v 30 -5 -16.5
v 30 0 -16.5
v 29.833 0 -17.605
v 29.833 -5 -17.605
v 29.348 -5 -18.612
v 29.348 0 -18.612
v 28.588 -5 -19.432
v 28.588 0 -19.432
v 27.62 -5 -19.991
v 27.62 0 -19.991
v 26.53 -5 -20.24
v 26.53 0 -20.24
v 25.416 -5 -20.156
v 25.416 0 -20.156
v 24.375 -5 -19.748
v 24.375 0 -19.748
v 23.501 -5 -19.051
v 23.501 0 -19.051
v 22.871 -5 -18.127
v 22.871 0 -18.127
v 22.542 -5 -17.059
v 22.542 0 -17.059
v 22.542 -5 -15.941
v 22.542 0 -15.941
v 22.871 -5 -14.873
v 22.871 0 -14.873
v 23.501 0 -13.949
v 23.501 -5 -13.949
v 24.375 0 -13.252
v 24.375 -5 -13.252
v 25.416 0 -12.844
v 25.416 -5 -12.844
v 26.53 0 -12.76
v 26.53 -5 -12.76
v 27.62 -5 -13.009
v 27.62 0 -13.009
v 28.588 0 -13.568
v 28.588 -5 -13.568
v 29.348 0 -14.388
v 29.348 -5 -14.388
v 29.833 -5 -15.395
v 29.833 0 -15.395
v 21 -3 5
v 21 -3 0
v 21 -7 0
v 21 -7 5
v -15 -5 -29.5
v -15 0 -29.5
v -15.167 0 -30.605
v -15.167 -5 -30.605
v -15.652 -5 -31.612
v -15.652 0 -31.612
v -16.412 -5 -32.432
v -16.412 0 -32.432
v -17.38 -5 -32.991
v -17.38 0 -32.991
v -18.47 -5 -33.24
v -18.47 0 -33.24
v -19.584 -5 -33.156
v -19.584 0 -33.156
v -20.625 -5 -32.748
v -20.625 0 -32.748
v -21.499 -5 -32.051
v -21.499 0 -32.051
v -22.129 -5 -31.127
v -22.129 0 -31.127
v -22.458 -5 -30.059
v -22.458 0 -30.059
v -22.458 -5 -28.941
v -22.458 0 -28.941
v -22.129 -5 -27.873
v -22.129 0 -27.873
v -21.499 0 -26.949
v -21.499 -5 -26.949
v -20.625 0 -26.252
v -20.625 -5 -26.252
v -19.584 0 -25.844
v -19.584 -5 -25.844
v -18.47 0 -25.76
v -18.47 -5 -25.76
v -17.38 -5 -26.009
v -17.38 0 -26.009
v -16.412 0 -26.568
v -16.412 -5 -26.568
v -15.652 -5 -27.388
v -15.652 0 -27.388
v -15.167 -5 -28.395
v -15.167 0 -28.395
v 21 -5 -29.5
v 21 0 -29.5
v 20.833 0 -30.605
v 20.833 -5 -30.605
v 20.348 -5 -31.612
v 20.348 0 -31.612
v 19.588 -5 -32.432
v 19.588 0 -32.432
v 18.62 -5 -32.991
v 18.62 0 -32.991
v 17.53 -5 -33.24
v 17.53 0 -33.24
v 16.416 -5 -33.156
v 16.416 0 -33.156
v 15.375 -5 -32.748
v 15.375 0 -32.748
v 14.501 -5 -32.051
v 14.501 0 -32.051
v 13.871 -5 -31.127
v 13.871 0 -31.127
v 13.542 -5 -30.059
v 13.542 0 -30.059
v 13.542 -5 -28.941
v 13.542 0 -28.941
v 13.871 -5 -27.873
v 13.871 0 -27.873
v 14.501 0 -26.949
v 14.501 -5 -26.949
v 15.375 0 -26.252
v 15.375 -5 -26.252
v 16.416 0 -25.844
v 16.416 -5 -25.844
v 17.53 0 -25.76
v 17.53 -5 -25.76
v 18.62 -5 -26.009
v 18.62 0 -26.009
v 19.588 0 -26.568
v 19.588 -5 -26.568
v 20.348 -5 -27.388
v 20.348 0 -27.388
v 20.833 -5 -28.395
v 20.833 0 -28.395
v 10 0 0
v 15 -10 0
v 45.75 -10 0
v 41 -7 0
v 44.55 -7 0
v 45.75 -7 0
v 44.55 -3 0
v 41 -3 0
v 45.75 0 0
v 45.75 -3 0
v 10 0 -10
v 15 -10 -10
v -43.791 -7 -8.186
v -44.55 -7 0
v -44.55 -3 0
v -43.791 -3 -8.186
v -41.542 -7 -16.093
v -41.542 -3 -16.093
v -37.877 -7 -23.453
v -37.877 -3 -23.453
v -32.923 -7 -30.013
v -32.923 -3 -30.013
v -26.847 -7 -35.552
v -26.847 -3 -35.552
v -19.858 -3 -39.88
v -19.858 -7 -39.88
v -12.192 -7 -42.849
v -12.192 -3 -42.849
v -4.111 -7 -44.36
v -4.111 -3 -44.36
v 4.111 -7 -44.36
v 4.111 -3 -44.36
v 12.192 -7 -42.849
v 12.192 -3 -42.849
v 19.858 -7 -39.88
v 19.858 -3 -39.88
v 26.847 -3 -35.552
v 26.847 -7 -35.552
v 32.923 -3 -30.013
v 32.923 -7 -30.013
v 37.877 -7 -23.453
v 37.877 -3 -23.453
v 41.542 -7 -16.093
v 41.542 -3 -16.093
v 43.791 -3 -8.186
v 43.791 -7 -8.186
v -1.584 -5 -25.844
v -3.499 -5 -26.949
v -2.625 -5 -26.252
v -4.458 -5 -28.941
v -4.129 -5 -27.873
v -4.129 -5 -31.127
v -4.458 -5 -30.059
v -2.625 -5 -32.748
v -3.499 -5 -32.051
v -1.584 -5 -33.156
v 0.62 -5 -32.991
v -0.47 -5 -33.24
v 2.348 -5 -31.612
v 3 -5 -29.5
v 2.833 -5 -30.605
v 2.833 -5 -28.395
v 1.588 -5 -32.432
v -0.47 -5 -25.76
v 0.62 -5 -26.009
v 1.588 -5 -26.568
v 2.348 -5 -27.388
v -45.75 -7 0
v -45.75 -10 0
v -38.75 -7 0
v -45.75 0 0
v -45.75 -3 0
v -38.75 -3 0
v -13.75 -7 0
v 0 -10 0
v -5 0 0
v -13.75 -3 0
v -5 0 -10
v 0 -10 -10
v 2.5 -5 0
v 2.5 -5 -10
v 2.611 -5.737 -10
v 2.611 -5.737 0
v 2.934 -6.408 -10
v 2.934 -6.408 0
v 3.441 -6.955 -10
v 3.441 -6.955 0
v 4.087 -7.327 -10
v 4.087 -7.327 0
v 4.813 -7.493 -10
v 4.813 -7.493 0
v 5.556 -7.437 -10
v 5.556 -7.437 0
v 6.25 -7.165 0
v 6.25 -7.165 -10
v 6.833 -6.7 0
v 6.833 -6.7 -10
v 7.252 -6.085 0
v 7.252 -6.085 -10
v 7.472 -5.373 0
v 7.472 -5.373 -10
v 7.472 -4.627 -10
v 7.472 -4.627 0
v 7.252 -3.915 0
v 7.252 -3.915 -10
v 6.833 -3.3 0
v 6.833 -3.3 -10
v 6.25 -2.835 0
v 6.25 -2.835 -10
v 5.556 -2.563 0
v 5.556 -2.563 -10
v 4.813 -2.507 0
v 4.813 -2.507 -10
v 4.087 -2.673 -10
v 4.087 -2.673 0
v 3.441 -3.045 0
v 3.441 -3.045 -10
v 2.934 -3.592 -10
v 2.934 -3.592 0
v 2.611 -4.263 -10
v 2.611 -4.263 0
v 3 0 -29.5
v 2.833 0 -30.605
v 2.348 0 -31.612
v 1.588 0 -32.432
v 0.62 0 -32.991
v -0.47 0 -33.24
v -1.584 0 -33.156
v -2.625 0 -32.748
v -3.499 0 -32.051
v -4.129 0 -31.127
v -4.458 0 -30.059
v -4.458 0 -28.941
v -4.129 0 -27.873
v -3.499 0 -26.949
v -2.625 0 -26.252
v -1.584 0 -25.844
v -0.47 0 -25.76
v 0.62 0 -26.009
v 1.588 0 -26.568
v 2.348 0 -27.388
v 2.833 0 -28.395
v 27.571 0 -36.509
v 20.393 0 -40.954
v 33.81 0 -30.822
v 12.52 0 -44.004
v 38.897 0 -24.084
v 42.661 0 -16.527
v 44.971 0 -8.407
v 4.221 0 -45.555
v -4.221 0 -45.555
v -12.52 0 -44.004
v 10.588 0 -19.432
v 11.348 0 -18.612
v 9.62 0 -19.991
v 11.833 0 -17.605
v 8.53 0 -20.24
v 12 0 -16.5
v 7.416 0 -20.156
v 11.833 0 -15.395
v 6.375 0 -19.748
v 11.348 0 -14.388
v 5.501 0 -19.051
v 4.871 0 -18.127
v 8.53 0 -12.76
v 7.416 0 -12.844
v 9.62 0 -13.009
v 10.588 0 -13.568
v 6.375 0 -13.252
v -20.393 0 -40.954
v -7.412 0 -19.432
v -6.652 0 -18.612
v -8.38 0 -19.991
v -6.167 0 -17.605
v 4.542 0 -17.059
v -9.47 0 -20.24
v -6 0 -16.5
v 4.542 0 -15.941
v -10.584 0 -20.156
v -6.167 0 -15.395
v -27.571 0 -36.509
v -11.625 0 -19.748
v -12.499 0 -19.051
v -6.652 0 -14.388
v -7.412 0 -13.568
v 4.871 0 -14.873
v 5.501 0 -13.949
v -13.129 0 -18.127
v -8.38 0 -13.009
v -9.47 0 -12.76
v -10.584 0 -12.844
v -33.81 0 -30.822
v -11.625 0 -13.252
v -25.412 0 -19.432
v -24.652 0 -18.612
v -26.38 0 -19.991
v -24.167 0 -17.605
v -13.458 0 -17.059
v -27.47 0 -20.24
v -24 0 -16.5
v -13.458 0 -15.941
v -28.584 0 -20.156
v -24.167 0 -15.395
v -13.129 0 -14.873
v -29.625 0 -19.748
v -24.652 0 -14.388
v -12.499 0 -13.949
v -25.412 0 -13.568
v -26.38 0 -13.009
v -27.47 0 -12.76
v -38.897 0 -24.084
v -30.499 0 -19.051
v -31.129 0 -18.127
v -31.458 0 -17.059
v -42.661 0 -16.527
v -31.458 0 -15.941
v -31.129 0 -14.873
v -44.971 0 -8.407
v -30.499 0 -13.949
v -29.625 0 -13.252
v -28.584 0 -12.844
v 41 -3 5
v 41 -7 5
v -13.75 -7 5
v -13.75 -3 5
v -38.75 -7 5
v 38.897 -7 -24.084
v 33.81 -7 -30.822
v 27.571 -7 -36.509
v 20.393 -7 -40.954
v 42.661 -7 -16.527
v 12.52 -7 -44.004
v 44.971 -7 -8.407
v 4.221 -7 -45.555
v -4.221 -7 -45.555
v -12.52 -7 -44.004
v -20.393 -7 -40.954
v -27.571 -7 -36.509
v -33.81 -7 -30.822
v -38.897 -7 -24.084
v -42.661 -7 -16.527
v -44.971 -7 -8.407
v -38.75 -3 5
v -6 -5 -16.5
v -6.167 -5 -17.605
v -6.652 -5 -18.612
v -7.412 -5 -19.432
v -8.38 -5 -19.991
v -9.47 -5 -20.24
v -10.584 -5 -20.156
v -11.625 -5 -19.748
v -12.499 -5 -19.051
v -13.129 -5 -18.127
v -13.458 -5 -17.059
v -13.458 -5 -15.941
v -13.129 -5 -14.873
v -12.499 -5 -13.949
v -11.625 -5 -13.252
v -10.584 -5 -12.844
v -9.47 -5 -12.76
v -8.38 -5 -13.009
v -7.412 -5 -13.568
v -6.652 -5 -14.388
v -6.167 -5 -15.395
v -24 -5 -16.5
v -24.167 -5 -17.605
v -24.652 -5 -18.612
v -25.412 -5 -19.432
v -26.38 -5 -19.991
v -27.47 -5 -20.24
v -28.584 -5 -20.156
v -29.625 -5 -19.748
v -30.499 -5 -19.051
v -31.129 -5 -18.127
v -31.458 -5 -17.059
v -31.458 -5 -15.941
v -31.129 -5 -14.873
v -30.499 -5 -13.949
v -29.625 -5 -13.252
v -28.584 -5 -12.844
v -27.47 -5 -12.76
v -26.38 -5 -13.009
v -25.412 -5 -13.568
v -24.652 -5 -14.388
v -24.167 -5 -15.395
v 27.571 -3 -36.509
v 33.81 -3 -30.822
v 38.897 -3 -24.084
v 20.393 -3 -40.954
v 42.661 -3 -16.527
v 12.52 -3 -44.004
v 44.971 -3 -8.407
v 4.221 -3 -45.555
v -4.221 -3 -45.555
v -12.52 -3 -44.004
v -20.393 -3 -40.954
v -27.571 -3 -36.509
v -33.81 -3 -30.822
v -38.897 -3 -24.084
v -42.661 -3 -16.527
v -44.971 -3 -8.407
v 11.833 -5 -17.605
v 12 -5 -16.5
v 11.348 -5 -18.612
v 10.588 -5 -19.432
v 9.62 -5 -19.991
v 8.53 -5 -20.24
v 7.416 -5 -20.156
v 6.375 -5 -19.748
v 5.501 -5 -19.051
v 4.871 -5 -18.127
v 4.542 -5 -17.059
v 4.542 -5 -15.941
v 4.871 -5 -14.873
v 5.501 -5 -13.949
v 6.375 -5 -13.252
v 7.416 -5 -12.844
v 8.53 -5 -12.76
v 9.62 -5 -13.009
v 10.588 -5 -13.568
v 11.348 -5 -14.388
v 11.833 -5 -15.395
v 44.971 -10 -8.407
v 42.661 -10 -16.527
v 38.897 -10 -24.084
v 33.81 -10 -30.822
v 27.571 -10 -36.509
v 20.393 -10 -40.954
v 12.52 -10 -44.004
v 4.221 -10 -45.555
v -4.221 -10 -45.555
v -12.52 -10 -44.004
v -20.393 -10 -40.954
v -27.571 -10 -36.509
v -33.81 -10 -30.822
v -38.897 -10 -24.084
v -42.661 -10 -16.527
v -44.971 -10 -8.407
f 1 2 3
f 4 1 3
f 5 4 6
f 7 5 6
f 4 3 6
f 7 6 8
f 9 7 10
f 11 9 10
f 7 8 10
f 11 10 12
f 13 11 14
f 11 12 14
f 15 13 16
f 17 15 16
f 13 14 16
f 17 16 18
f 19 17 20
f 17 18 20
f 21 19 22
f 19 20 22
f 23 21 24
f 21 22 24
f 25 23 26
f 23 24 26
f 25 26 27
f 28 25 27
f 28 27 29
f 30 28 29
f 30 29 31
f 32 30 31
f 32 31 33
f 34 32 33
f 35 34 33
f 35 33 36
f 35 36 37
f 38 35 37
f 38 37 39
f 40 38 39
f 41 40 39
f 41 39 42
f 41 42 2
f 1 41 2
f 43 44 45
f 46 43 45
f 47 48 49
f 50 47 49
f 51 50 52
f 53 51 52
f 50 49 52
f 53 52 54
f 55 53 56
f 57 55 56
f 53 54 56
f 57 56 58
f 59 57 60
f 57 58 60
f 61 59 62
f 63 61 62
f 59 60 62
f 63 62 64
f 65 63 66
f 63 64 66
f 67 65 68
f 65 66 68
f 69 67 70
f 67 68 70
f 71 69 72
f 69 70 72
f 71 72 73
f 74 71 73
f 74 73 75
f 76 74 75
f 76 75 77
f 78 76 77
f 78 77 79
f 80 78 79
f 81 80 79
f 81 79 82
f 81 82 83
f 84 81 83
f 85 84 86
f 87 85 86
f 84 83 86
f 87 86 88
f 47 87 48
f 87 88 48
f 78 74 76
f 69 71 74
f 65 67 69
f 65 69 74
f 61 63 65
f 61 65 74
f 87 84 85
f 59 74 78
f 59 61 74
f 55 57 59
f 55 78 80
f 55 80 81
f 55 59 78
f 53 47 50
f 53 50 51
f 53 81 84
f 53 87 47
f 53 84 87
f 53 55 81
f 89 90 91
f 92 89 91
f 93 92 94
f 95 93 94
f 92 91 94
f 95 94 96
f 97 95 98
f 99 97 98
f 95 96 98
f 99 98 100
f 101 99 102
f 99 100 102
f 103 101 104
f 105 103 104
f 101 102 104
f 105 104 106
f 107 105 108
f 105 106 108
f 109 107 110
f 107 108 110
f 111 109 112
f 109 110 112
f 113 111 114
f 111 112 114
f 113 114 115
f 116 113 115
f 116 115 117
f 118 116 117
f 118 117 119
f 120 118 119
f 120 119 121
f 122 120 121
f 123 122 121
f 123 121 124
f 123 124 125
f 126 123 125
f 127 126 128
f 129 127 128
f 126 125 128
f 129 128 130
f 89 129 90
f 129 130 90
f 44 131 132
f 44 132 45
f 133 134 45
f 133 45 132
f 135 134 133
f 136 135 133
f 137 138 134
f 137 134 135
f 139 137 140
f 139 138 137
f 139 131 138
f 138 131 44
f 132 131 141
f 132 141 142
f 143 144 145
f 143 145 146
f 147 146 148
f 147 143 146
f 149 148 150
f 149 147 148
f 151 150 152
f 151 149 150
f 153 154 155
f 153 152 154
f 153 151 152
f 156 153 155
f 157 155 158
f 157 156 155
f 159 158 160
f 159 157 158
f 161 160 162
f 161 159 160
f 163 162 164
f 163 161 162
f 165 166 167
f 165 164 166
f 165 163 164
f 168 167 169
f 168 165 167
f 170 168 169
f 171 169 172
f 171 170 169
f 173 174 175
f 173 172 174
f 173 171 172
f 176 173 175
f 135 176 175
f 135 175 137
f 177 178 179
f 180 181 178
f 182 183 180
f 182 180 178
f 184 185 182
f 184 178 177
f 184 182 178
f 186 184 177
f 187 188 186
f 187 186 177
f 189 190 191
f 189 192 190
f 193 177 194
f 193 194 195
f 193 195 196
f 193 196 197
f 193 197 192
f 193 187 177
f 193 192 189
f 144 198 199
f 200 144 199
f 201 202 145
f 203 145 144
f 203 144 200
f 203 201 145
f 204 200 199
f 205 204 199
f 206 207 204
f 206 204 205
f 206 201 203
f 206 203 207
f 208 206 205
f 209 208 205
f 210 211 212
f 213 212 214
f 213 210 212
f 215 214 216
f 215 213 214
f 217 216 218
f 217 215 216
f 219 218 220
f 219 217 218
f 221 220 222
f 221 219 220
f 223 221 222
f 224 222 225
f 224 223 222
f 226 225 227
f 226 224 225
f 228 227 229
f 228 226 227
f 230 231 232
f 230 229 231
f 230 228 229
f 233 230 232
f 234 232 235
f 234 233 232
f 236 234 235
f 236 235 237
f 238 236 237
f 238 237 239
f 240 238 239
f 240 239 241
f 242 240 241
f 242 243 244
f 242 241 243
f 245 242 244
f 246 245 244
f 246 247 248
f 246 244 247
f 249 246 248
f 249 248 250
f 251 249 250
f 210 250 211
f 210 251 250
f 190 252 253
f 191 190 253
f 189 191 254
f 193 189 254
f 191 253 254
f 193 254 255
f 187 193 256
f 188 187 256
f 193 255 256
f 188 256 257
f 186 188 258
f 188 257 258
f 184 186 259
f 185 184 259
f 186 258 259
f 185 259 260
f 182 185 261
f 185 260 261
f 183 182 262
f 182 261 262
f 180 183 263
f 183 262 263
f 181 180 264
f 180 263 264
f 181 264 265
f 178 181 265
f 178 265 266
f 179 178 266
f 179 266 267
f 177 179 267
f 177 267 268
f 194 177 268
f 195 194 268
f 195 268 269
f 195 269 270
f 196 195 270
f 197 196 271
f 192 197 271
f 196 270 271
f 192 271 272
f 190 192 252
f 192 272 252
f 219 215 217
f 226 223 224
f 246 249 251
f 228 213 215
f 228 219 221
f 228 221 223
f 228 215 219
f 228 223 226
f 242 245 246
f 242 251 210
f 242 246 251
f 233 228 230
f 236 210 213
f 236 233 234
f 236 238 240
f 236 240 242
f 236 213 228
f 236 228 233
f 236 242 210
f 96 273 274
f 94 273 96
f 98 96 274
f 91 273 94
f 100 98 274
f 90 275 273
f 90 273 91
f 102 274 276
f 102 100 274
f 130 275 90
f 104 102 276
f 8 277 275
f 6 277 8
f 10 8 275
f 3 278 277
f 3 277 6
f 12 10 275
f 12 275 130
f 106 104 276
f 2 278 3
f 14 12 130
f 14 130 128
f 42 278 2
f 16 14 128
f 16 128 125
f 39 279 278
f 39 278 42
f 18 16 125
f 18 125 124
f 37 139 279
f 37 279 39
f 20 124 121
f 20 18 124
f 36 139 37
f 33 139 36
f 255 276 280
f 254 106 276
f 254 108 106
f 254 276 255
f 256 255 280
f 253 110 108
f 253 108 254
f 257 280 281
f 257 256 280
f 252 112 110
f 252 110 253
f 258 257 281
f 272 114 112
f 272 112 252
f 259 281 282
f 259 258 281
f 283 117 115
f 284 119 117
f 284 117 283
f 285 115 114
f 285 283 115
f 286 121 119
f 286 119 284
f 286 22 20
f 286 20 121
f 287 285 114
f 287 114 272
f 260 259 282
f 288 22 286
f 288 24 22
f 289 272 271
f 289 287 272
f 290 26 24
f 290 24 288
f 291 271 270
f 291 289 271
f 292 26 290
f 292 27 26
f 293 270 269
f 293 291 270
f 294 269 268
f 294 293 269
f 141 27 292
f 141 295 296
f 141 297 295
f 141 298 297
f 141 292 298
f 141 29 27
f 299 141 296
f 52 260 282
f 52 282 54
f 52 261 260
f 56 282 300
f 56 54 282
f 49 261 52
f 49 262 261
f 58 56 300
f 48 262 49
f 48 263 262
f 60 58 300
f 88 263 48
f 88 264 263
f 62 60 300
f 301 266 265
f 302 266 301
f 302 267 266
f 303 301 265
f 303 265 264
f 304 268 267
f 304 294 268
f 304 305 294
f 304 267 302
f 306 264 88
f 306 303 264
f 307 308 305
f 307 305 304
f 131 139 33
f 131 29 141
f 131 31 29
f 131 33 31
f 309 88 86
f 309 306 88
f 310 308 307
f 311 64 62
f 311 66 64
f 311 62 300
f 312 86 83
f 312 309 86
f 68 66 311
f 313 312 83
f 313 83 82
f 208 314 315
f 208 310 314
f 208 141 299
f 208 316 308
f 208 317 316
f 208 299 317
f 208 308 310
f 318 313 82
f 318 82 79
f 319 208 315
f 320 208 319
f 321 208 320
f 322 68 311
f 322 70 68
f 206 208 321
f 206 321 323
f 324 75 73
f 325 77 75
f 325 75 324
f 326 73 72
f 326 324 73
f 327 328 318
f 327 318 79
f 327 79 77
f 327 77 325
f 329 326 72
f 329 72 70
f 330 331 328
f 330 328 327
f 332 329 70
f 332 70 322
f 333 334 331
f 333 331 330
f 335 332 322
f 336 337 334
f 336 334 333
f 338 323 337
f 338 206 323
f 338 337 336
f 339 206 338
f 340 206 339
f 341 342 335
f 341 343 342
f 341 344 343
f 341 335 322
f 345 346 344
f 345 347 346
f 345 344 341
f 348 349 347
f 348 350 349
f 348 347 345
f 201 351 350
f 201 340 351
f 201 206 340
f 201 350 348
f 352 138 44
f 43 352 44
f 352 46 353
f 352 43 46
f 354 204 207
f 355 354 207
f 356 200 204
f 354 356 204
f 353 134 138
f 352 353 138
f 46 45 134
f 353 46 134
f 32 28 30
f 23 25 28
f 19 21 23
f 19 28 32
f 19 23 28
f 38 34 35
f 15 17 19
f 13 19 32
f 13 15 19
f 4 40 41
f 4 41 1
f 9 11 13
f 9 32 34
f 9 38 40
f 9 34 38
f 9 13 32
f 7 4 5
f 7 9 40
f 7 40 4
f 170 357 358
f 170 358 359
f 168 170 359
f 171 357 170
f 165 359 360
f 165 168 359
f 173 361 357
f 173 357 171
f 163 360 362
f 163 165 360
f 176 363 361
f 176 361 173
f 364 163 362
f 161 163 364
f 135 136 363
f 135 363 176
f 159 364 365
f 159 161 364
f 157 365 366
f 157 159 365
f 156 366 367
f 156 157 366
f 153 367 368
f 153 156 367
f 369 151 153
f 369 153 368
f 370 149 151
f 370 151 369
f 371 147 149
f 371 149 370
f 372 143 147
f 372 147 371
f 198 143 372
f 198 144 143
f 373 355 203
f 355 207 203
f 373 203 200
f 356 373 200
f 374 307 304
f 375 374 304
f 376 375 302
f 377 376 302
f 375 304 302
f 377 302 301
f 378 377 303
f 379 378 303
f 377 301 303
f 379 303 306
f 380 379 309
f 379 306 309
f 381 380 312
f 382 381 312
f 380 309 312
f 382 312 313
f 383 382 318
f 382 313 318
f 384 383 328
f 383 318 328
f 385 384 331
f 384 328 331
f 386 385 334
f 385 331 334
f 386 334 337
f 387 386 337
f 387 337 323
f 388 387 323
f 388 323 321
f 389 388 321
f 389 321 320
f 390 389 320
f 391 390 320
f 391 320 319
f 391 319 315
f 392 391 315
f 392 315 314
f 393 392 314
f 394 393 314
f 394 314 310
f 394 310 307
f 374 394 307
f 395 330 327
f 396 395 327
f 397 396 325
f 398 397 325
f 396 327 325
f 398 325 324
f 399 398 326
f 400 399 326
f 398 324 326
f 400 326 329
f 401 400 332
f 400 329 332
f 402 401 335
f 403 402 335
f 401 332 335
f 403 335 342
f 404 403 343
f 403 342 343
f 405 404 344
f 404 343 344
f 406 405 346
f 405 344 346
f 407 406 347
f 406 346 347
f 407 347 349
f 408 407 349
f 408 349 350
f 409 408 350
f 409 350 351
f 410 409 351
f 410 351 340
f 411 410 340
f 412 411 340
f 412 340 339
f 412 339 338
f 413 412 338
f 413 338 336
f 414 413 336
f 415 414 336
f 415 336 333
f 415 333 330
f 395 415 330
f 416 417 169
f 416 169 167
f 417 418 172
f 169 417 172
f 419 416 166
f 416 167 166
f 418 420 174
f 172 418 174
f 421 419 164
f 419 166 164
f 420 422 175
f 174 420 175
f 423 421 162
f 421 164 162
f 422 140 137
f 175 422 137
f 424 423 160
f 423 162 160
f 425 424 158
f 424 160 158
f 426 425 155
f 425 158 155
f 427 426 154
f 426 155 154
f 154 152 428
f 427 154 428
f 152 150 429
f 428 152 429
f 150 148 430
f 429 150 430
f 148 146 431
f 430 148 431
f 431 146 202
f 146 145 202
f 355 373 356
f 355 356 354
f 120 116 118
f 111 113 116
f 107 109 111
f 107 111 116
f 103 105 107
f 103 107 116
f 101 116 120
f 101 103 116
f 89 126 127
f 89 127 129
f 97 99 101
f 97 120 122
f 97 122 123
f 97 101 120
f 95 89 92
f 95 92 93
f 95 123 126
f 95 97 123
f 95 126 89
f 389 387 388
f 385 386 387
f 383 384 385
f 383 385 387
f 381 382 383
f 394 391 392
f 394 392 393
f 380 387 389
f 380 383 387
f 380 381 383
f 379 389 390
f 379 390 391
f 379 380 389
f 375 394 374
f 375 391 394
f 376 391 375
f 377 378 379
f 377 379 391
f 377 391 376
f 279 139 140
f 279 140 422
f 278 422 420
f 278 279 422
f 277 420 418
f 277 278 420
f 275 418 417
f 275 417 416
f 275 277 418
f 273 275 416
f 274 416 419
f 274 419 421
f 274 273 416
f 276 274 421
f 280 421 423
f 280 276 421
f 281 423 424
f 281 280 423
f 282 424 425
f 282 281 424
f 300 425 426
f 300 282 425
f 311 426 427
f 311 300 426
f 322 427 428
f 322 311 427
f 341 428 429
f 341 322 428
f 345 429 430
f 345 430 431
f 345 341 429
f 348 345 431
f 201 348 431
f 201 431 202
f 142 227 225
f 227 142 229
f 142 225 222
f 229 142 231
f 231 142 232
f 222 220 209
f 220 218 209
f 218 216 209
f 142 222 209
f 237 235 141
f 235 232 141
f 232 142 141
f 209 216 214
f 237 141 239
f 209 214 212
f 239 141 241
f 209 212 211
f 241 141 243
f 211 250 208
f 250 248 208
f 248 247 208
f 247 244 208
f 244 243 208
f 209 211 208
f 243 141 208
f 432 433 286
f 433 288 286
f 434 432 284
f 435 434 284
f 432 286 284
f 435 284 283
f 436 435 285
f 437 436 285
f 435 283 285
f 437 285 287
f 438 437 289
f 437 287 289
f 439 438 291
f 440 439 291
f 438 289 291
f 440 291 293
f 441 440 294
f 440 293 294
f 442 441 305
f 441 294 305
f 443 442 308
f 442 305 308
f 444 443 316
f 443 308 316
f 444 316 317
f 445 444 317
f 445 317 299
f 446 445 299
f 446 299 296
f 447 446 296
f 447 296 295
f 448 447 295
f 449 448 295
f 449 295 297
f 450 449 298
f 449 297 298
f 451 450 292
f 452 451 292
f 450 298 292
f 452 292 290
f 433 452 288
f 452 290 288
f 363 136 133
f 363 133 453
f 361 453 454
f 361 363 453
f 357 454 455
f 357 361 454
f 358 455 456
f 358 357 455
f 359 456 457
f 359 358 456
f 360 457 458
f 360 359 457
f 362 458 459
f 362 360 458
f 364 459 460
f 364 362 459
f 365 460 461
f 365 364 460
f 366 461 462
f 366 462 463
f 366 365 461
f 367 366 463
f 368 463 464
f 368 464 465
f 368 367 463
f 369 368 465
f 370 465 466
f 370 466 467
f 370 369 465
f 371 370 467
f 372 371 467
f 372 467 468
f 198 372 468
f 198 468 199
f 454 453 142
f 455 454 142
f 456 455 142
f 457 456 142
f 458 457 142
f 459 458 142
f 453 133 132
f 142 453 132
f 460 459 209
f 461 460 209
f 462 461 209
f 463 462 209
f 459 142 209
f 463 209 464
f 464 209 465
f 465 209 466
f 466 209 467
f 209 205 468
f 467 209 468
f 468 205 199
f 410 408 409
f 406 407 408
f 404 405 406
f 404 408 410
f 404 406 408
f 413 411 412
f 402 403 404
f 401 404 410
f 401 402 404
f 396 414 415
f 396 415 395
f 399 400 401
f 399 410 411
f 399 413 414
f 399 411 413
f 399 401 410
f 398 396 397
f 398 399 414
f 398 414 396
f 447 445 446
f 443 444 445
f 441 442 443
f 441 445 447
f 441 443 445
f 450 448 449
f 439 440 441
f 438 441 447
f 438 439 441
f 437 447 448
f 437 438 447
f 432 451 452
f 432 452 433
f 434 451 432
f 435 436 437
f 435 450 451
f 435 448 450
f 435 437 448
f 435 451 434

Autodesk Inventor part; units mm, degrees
ref_plane "YZ Plane" through (0, 0, 0) normal (1, 0, 0) x (0, 1, 0)
ref_plane "XZ Plane" through (0, 0, 0) normal (0, 1, 0) x (-1, 0, 0)
ref_plane "XY Plane" through (0, 0, 0) normal (0, 0, 1) x (1, 0, 0)
sketch "스케치1" plane through (0, 0, 0) normal (0, 1, 0) x (-1, 0, 0)
  line L0 (-10, 10) -> (10, 10)
  line L1 (10, 10) -> (10, -10)
  line L2 (10, -10) -> (-10, -10)
  line L3 (-10, -10) -> (-10, 10)
  line L4 (-10, 10) -> (10, -10) construction
  line L5 (10, 10) -> (-10, -10) construction
  line L6 (-10, -10) -> (-15, -10)
  line L7 (-15, -10) -> (-15, 10)
  line L8 (-15, 10) -> (-10, 10)
  line L9 (-10, 10) -> (-10, -10)
  circle A0 centre (0, 0) radius 45.75
  dimension "d0" = 20
  dimension "d1" = 20
  dimension "d2" = 5
  dimension "d17" = 91.5
ref_plane "작업 평면2" through (-10, 20, -10) normal (-1, 0, 0) x (0, 0, 1)
sketch "스케치2" plane through (-10, 20, -10) normal (-1, 0, 0) x (0, 0, 1)
  line L0 (20, -100) -> (20, 0) projected
  line L1 (0, 0) -> (20, 0) projected
  line L2 (0, 0) -> (0, -100) projected
  line L3 (20, -100) -> (0, -100) projected
  circle A0 centre (10, -91) radius 4.5
  point P0 (10, -20)
  dimension "d7" = 9
  dimension "d8" = 9
ref_plane "작업 평면1" through (-10, 20, 10) normal (0, 0, 1) x (1, 0, 0)
sketch "스케치3" plane through (-10, 20, 10) normal (0, 0, 1) x (1, 0, 0)
  line L0 (20, -20) -> (25, -20) projected
  line L1 (25, -20) -> (25, 0) projected
  line L2 (0, 0) -> (25, 0) projected
  line L3 (0, -100) -> (0, 0) projected
  line L4 (20, -100) -> (0, -100) projected
  line L5 (20, -20) -> (20, -100) projected
  line L6 (25, -20) -> (25, 0) projected
  line L7 (25, 0) -> (0, 0) projected
  arc A0 (25, -20) -> (20, 0) centre (-10.6945, -18.2986) ccw
  line L8 (20, 0) -> (25, 0)
  line L9 (25, 0) -> (25, -20)
  point P0 (10, -20)
  point P1 (20, 0)
  point P2 (25, -16.5972)
extrude "돌출4" [suppressed]
extrude "돌출5" [suppressed]
extrude "돌출6" add sketch "스케치1" against normal blind 10
ref_plane "작업 평면3" through (10, 0, -10) normal (0, 0, 1) x (1, 0, 0)
sketch "스케치4" plane through (10, 0, -10) normal (0, 0, 1) x (1, 0, 0)
  line L0 (0, -5) -> (-10, -5) projected
  line L1 (-10, -5) -> (-10, -80) projected
  line L2 (0, -80) -> (-10, -80) projected
  line L3 (0, -5) -> (0, -80) projected
  line L4 (-10, 0) -> (0, 0) projected
  line L5 (0, 0) -> (5, 0) projected
  line L6 (5, 0) -> (5, 3.4028) projected
  arc A0 (5, 3.4028) -> (0, 20) centre (-30.6945, 1.7014) ccw projected
  line L7 (-10, 20) -> (0, 20) projected
  line L8 (-10, 20) -> (-10, 0) projected
  line L9 (0, -5) -> (5, -5)
  line L10 (5, -5) -> (5, 0)
  line L11 (5, 0) -> (0, 0)
  line L12 (0, 0) -> (0, -5)
  line L13 (-55.75, -5) -> (35.75, -5) projected
  line L14 (-10, 0) -> (-15, 0)
  line L15 (-15, 0) -> (-15, -5)
  line L16 (-15, -5) -> (-10, -5)
  line L17 (-10, -5) -> (-10, 0)
  line L18 (-15, 0) -> (-10, -5)
  line L19 (0, 0) -> (5, -5)
  dimension "d20" = 5
sketch "스케치5" plane through (0, 0, 0) normal (0, 1, 0) x (1, 0, 0)
  circle A0 centre (0, 0) radius 45.75 projected
  line L0 (15, -10) -> (-10, -10) projected
  line L1 (-10, 10) -> (15, 10) projected
  line L2 (-12.2866, 10.5) -> (15, 10.5)
  line L3 (15, 10.5) -> (15, -10.5)
  line L4 (15, -10.5) -> (-12.2866, -10.5)
  line L5 (-12.2866, -10.5) -> (-12.2866, 10.5)
  line L6 (15, 10) -> (15, -10) projected
  line L7 (-10, -10) -> (-10, 10) projected
  dimension "d22" = 0.5
extrude "돌출7" [suppressed]
sketch "스케치6" plane through (-12.2866, 0, -10.5) normal (0, 0, 1) x (1, 0, 0)
  line L0 (7.2866, 0) -> (12.2866, -5) projected
  line L1 (7.2866, 0) -> (7.2866, -5) projected
  line L2 (7.2866, -5) -> (12.2866, -5) projected
  line L3 (22.2866, 0) -> (27.2866, -5) projected
  line L4 (22.2866, 0) -> (22.2866, -5) projected
  line L5 (22.2866, -5) -> (27.2866, -5) projected
  point P0 (12.2866, 0)
extrude "돌출8" [suppressed]
extrude "돌출9" add sketch "스케치4" along normal blind 20.5 and the other way blind 0.5 contours L19 L5 L10
ref_plane "작업 평면4" through (-12.2866, -5, -10.5) normal (0, 0, 1) x (1, 0, 0)
sketch "스케치7" plane through (-12.2866, -5, -10.5) normal (0, 0, 1) x (1, 0, 0)
  line L0 (7.2866, 0) -> (7.2866, 5) projected
  line L1 (0, 5) -> (7.2866, 5) projected
  line L2 (0, 5) -> (0, 0) projected
  line L3 (7.2866, 0) -> (0, 0) projected
  line L4 (0, 5) -> (7.2866, 5)
  line L5 (7.2866, 5) -> (7.2866, 0)
  line L6 (7.2866, 0) -> (0, 0)
  line L7 (0, 0) -> (0, 5)
  point P0 (12.2866, 5)
extrude "돌출10" add sketch "스케치7" along normal blind 21
sketch "스케치8" plane through (-5, 0, -10) normal (0, 0, 1) x (1, 0, 0)
  line L0 (0, 0) -> (0, -5) projected
  line L1 (20, -10) -> (-5, -10) projected
  line L2 (20, -5) -> (15, 0) projected
  line L3 (0, 0) -> (15, 0) projected
  line L4 (0, 0) -> (5, 0)
  line L5 (5, 0) -> (5, -10)
  line L6 (5, -10) -> (0, -10)
  line L7 (0, -10) -> (0, 0)
  line L8 (0, 0) -> (5, -10)
  line L9 (0, -5) -> (-5, -5) projected
  line L10 (-5, -5) -> (-5, -10) projected
  line L11 (20, -5) -> (20, -10) projected
  dimension "d33" = 5
extrude "돌출11" add sketch "스케치8" along normal blind 21
sketch "스케치9" plane through (0, 0, 0) normal (0, 1, 0) x (1, 0, 0)
  line L0 (10, -10) -> (-10, -10) projected
  line L1 (10, 10) -> (10, -10) projected
  line L2 (64.05, 10) -> (-64.05, 10) projected
  line L3 (-10, -64.05) -> (-10, 64.05) projected
  line L4 (-10, -10) -> (-10, 10) projected
  line L5 (-10, 10) -> (10, 10) projected
  line L6 (10, -10) -> (0, -10)
  line L7 (0, -10) -> (0, 10)
  line L8 (0, 10) -> (10, 10)
  line L9 (10, 10) -> (10, -10)
  point P0 (0, 0)
extrude "돌출12" cut sketch "스케치9" against normal blind 10 contours L0 L7 L2 L1
sketch "스케치10" plane through (10, 0, 10) normal (0, 0, -1) x (-1, 0, 0)
  line L0 (-5, 0) -> (0, 0) projected
  line L1 (0, 0) -> (0, -10) projected
  line L2 (-35.75, -10) -> (55.75, -10) projected
  line L3 (0, 0) -> (-5, 0)
  line L4 (-5, 0) -> (-5, -10)
  line L5 (-5, -10) -> (0, -10)
  line L6 (0, -10) -> (0, 0)
  line L7 (0, 0) -> (-5, -10)
  line L8 (10, 0) -> (15, 0)
  line L9 (15, 0) -> (15, -10)
  line L10 (15, -10) -> (10, -10)
  line L11 (10, -10) -> (10, 0)
  line L12 (15, 0) -> (10, -10)
  dimension "d38" = 5
extrude "돌출13" cut sketch "스케치10" along normal blind 20 contours L11 L8 L12
extrude "돌출14" cut sketch "스케치10" along normal blind 20 contours L1 L2 L7
sketch "스케치11" plane through (10, 0, 10) normal (0, 0, -1) x (-1, 0, 0)
  line L0 (-35.75, -10) -> (55.75, -10) projected
  line L1 (55.75, 0) -> (-35.75, 0) projected
  line L2 (0, 0) -> (0, -10) projected
  line L3 (10, -10) -> (10, 0) projected
  line L4 (0, 0) -> (10, 0)
  line L5 (10, 0) -> (10, -10)
  line L6 (10, -10) -> (0, -10)
  line L7 (0, -10) -> (0, 0)
  circle A0 centre (5, -5) radius 2.5
  dimension "d43" = 5
extrude "돌출15" add sketch "스케치11" along normal blind 20 contours A0
sketch "스케치12" plane through (-10, 20, 10) normal (0, 0, 1) x (1, 0, 0)
  point P0 (10, -20)
sketch "스케치13" plane through (0, 0, 0) normal (0, 0, 1) x (1, 0, 0)
  line L0 (-45.75, -10) -> (45.75, -10) projected
  line L1 (45.75, 0) -> (-45.75, 0) projected
  line L2 (-45.75, -10) -> (45.75, -10) projected
  line L3 (-45.75, 0) -> (45.75, 0)
  line L4 (45.75, 0) -> (45.75, -10)
  line L5 (45.75, -10) -> (-45.75, -10)
  line L6 (-45.75, -10) -> (-45.75, 0)
  point P0 (0, 0)
extrude "돌출16" cut sketch "스케치13" along normal blind 50
sketch "스케치14" plane through (0, 0, 0) normal (0, 0, 1) x (1, 0, 0)
  line L0 (-38.75, -7) -> (-13.75, -7)
  line L1 (-13.75, -7) -> (-13.75, -3)
  line L2 (-13.75, -3) -> (-38.75, -3)
  line L3 (-38.75, -3) -> (-38.75, -7)
  line L4 (0, -10) -> (-45.75, -10) projected
  line L5 (-45.75, 0) -> (-45.75, -10) projected
  circle A0 centre (5, -5) radius 2.5 projected
  line L6 (5, -26.6285) -> (5, 24.5755)
  line L7 (21, -7) -> (41, -7)
  line L8 (41, -7) -> (41, -3)
  line L9 (41, -3) -> (21, -3)
  line L10 (21, -3) -> (21, -7)
  line L11 (45.75, 0) -> (45.75, -10) projected
  line L12 (-45.75, -3) -> (-44.55, -3)
  line L13 (-44.55, -3) -> (-44.55, -7)
  line L14 (-44.55, -7) -> (-45.75, -7)
  line L15 (-45.75, -7) -> (-45.75, -3)
  line L16 (0, -36.8693) -> (0, 34.8163) projected
  point P0 (0, 0)
  point P1 (45.75, -5)
  dimension "d48" = 25
  dimension "d49" = 4
  dimension "d50" = 3
  dimension "d51" = 7
  dimension "d52" = 20
  dimension "d53" = 4
  dimension "d54" = 4.75
  dimension "d57" = 1.2
extrude "돌출17" add sketch "스케치14" along normal blind 5 contours L3 L2 L1 L0 | L10 L9 L8 L7
revolve "회전1" cut sketch "스케치14" angle 360 about axis through (0, -10, 0) along (0, 1, 0) contours L12 L13 L14 L5
sketch "스케치15" plane through (0, 0, 0) normal (0, 1, 0) x (1, 0, 0)
  circle A0 centre (-27.75, 16.5) radius 3.75
  circle A1 centre (-9.75, 16.5) radius 3.75
  circle A2 centre (8.25, 16.5) radius 3.75
  circle A3 centre (26.25, 16.5) radius 3.75
  circle A4 centre (-18.75, 29.5) radius 3.75
  circle A5 centre (-0.75, 29.5) radius 3.75
  line L0 (-44.55, 0) -> (-45.75, 0) projected
  line L1 (-45.75, 0) -> (-45.75, 37.0208)
  circle A6 centre (17.25, 29.5) radius 3.75
  line L2 (64.05, 10.5) -> (-64.05, 10.5) projected
  point P0 (0, 0)
  dimension "d59" = 7.5
  dimension "d60" = 7.5
  dimension "d61" = 7.5
  dimension "d62" = 7.5
  dimension "d63" = 7.5
  dimension "d64" = 7.5
  dimension "d66" = 18
  dimension "d67" = 18
  dimension "d68" = 18
  dimension "d69" = 18
  dimension "d70" = 9
  dimension "d71" = 9
  dimension "d73" = 7.5
  dimension "d74" = 9
  dimension "d75" = 13
  dimension "d76" = 13
  dimension "d77" = 13
  dimension "d80" = 6
  dimension "d81" = 6
extrude "돌출18" cut sketch "스케치15" against normal blind 5
properties part number "new탄두윗판구멍1_1_3"
